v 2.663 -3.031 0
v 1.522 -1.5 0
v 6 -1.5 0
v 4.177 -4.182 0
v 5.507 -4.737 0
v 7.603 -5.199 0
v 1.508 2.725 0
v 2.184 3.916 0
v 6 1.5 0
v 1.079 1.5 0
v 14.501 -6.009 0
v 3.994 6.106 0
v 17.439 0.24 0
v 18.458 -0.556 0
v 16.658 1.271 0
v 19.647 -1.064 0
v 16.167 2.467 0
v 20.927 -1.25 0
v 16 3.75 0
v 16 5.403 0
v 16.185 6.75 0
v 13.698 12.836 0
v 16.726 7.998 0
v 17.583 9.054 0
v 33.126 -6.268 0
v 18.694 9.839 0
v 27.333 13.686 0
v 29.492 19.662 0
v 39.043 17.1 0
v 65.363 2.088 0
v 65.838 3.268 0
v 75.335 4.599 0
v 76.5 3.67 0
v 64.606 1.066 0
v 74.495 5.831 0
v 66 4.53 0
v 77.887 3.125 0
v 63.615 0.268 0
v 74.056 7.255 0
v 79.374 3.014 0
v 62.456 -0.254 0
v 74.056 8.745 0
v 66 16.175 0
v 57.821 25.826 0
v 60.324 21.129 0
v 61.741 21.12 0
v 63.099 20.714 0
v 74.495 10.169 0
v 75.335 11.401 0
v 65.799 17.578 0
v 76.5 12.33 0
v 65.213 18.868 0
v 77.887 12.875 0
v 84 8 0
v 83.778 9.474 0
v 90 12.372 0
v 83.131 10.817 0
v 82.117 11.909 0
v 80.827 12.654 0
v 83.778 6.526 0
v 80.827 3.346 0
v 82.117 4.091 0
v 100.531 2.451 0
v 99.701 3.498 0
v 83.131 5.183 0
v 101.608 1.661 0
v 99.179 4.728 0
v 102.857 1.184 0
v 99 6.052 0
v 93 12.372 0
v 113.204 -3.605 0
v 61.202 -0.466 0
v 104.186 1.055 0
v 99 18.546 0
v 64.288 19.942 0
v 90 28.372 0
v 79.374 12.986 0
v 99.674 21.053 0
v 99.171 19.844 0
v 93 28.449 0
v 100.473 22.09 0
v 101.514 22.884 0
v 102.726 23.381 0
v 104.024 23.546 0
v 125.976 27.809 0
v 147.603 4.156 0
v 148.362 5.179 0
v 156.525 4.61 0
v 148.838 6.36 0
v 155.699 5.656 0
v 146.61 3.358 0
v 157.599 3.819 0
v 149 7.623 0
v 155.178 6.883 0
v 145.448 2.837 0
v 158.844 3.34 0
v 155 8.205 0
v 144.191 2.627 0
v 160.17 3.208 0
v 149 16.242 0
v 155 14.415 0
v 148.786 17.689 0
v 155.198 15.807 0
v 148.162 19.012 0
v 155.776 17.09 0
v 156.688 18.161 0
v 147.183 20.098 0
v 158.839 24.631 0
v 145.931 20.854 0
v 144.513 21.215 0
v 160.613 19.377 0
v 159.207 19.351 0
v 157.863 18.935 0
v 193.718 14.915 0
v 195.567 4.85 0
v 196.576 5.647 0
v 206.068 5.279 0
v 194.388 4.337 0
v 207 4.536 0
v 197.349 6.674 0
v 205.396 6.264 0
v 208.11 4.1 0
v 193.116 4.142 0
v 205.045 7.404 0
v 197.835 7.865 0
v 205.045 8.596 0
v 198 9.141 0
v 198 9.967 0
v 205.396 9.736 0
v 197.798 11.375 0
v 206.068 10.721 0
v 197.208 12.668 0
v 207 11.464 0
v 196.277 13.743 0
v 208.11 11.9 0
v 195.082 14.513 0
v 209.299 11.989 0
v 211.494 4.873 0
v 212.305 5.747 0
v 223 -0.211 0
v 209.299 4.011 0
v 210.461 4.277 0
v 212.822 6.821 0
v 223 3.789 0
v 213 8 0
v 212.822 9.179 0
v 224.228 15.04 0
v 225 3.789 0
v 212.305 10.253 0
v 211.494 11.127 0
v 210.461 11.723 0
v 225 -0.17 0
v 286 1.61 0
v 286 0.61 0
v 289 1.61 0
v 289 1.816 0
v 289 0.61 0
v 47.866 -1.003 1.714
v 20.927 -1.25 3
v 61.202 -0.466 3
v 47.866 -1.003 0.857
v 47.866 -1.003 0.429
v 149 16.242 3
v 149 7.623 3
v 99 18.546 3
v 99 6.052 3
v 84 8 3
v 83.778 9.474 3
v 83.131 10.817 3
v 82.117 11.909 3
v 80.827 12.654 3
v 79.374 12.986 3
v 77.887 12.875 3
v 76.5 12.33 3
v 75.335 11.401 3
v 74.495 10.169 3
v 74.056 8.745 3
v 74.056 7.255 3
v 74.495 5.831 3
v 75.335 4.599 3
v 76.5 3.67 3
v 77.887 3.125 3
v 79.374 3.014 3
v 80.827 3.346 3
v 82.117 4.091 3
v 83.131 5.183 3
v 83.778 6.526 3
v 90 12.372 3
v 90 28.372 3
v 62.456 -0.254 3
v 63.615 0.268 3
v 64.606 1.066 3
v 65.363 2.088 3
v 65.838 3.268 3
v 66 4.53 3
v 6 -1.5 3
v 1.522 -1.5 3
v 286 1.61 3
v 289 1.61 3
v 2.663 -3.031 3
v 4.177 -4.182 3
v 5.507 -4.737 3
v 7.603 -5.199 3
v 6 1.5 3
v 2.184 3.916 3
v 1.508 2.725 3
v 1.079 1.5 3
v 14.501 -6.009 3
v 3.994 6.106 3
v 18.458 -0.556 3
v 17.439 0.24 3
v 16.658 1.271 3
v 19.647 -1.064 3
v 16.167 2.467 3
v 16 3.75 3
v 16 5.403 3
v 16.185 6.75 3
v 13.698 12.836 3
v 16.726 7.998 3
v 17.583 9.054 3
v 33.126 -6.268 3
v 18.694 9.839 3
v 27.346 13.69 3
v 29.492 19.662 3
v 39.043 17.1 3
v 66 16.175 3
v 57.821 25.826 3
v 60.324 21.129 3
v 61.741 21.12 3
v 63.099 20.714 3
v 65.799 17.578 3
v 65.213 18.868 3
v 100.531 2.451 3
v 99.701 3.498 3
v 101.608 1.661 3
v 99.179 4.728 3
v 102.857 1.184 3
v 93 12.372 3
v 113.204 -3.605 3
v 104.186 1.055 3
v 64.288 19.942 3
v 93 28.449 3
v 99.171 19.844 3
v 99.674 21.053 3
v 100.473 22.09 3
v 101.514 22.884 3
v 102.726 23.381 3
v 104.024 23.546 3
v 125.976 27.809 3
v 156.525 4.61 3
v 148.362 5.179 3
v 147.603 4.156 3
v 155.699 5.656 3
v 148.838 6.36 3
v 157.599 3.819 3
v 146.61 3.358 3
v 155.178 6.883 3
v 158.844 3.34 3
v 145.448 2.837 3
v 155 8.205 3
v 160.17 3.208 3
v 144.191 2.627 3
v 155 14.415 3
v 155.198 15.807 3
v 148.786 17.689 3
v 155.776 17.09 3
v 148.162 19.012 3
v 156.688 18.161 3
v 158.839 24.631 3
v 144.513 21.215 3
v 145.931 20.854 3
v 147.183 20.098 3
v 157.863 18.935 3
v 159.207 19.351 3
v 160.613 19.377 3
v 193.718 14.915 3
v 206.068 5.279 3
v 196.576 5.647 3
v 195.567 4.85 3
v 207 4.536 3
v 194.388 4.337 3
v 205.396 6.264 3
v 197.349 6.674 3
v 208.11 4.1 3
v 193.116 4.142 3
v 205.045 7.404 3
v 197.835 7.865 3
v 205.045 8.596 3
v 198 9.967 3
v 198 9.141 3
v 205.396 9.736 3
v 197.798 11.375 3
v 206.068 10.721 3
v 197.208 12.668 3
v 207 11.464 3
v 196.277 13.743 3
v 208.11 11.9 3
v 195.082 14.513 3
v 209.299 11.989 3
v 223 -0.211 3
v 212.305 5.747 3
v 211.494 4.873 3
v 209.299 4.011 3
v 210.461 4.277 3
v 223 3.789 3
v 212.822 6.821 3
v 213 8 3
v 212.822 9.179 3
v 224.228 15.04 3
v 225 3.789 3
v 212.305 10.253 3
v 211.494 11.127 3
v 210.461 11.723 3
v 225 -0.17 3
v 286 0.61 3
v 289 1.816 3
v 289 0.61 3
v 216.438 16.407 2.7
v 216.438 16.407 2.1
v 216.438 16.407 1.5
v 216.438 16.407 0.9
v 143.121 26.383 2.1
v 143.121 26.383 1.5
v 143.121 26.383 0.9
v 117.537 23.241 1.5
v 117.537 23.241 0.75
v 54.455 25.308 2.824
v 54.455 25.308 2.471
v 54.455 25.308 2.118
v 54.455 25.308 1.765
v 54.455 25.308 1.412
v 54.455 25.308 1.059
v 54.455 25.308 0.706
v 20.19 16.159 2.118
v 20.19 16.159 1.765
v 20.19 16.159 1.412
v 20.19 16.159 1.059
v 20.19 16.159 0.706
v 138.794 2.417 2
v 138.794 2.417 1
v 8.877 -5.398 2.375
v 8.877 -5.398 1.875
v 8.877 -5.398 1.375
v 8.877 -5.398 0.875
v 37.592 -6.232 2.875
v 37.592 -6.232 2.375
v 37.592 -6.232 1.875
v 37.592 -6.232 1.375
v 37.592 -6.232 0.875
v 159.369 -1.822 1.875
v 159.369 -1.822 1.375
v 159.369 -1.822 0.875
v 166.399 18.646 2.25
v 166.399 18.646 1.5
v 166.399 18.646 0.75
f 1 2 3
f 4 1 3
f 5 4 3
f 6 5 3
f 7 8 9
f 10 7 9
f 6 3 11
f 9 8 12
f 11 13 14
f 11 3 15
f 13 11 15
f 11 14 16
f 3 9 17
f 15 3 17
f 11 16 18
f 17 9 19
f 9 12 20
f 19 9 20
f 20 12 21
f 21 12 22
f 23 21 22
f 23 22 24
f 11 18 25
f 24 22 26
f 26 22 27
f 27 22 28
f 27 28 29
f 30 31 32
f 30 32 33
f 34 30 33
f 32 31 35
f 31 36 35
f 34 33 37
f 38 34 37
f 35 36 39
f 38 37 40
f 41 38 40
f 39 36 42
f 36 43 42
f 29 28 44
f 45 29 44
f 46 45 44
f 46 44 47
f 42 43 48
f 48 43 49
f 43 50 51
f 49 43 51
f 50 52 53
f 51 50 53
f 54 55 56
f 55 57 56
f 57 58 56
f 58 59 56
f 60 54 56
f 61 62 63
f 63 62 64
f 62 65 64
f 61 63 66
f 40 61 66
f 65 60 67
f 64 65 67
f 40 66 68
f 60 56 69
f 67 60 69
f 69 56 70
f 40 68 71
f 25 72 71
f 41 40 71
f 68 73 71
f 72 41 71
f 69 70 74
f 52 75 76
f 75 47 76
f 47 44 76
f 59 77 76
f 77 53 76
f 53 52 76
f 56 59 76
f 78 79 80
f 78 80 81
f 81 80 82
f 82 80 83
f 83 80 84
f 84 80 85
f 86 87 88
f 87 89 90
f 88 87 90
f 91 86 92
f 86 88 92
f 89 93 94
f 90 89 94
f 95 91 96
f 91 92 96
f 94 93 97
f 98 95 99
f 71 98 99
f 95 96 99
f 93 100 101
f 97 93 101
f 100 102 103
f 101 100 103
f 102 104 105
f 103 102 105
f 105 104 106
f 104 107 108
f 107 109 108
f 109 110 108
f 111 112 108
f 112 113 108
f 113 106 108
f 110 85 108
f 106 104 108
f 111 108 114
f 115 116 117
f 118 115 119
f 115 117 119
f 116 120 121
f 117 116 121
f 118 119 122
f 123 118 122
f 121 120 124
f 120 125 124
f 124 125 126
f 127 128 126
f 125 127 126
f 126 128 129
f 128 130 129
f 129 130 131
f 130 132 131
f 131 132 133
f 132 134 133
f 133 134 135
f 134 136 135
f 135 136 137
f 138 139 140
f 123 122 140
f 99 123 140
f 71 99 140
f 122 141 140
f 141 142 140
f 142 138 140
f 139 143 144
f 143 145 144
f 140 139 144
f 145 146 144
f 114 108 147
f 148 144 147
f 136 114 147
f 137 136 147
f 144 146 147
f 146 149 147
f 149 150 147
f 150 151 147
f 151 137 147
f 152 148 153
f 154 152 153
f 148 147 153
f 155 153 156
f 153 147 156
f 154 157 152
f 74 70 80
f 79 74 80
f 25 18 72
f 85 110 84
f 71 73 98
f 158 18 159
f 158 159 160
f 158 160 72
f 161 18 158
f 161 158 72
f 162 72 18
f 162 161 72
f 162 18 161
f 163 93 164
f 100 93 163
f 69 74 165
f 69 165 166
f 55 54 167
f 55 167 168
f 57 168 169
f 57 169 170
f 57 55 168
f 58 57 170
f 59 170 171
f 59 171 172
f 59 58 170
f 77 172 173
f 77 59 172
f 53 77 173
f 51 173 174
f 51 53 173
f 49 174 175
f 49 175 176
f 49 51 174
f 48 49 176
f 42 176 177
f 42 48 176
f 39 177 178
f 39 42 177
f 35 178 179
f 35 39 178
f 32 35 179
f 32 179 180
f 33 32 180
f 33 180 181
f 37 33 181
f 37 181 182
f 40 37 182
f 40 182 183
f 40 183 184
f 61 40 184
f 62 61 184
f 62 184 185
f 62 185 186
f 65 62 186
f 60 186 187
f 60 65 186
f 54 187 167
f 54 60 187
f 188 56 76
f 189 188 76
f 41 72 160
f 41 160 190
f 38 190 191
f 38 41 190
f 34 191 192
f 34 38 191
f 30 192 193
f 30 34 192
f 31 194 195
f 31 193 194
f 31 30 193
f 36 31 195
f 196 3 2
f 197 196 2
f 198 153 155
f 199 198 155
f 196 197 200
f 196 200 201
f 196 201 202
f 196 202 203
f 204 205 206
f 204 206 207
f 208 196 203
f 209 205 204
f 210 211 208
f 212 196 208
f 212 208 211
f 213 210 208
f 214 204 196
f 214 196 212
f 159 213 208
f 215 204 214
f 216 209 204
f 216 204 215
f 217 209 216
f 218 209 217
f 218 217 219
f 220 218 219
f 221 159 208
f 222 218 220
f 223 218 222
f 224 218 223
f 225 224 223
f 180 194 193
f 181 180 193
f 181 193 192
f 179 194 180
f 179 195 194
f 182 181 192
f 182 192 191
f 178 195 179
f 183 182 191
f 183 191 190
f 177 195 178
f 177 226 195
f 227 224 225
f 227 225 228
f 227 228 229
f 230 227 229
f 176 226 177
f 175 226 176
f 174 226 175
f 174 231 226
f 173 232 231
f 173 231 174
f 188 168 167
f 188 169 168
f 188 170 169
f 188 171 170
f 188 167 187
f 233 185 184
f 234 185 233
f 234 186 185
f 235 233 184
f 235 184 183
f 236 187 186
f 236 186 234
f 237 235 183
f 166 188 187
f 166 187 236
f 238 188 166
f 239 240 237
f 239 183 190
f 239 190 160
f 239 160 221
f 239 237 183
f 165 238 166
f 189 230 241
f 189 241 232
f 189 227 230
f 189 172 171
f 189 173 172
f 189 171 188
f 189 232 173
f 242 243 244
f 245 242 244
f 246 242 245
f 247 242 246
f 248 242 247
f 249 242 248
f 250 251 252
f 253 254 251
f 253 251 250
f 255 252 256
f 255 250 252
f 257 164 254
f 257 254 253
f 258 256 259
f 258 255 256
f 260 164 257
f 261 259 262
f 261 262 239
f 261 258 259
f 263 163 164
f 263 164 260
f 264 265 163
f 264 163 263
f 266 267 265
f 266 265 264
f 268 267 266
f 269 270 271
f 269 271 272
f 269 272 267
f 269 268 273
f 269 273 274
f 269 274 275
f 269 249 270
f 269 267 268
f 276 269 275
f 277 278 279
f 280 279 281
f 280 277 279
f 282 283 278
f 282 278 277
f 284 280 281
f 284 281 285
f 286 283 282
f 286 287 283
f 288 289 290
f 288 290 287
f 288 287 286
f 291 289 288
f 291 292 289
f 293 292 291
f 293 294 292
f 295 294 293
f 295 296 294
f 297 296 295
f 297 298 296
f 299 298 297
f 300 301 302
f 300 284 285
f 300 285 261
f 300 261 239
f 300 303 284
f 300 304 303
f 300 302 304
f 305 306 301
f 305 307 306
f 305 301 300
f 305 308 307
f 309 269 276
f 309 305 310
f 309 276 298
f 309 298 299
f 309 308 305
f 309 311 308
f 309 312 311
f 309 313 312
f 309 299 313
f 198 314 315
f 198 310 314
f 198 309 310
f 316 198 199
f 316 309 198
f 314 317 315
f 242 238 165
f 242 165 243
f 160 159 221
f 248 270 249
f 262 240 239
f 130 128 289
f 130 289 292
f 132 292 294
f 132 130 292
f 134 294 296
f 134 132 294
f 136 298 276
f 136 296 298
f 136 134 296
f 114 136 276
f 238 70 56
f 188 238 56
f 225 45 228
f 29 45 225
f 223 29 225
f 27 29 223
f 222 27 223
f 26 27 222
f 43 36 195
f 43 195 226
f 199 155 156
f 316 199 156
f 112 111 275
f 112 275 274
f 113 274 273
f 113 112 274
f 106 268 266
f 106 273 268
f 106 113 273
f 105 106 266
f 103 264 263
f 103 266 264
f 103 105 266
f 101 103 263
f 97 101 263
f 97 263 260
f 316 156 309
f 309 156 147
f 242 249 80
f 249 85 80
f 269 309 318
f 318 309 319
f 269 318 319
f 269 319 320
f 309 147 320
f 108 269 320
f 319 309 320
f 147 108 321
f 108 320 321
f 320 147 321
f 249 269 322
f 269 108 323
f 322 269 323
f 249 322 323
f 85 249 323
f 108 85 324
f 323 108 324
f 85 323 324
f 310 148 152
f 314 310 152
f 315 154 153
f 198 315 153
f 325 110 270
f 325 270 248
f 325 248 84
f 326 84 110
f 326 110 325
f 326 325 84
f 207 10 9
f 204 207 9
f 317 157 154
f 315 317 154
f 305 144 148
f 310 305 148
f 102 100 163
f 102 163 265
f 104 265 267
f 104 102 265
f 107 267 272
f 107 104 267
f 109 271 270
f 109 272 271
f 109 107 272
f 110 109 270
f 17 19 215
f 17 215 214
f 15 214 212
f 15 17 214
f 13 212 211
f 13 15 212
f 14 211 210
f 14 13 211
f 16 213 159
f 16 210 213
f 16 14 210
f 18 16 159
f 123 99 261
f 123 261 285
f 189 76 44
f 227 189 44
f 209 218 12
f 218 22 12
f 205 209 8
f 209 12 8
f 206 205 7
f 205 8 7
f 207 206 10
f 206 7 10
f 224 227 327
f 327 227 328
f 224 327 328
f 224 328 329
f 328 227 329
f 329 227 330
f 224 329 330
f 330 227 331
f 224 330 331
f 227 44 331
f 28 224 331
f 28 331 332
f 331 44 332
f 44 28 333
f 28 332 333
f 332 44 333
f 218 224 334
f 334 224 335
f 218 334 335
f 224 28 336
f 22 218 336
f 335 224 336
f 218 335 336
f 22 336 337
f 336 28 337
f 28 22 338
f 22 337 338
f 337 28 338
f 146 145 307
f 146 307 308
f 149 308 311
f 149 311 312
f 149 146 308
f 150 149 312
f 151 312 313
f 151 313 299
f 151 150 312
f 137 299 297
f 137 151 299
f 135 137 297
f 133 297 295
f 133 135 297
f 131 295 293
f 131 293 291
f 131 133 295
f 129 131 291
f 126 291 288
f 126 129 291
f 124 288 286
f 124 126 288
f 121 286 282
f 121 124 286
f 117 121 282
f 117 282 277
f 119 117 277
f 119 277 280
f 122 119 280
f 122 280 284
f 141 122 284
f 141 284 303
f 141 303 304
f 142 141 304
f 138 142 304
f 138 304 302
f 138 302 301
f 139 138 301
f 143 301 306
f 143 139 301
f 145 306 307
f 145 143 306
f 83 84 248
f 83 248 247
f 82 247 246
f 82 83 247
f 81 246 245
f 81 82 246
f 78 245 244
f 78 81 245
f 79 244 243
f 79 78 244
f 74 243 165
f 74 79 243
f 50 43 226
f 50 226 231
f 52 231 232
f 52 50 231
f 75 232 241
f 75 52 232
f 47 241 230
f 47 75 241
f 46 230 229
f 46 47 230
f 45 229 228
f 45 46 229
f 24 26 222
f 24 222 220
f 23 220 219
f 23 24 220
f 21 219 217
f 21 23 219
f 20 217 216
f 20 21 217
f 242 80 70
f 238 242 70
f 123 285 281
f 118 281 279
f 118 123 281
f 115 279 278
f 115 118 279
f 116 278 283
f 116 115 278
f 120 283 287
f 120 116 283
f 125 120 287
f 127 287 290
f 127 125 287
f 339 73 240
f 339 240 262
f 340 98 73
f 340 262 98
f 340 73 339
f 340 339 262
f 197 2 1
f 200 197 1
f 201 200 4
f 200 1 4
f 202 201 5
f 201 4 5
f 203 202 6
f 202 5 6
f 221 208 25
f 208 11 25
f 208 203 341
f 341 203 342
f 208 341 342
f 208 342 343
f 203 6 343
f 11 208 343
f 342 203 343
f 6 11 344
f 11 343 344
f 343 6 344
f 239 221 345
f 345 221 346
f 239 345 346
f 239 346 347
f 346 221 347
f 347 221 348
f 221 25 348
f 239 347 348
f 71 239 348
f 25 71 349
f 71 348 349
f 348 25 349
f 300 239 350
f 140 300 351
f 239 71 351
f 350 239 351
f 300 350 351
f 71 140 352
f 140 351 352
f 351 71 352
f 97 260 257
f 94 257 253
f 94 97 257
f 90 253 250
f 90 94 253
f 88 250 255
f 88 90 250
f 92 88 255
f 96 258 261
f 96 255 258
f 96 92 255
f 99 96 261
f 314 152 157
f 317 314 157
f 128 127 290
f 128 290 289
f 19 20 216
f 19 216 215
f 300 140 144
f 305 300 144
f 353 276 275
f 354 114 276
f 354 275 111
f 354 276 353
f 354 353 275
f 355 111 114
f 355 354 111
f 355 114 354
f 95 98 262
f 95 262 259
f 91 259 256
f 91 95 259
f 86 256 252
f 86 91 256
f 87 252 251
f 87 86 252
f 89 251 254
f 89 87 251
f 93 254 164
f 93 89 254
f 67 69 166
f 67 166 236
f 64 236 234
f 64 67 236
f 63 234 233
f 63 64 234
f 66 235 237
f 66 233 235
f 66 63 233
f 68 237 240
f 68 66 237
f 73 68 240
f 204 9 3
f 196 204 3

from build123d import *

# Parameters (mm, degrees)
SKETCH_1_R          = 5
SKETCH_1_R_2        = 4
EXTRUDE_1_DEPTH     = 3
CUT_EXTRUDE_2_DEPTH = 291.422386836


with BuildPart() as part:
    # 草图1 → 凸台-拉伸1 (new body)
    with BuildSketch(Plane.XY):
        with BuildLine():
            Line((90, 12.3715), (90, 28.372426217))
            add(Edge.make_bspline(
                [(90, 28.372426217), (89.259446982, 28.350928743), (82.363996343, 28.13322439), (72.403347361, 27.586524792), (60.185862052, 26.226268085), (51.080991088, 24.79810862), (42.033943524, 23.000087944), (34.581994337, 21.174922903), (28.697351661, 19.44563851), (24.361981086, 17.983441115), (20.174828998, 16.207949367), (16.078941989, 14.139912989), (12.040296713, 11.946766626), (8.14011433, 9.56039573), (5.153679337, 7.316395724), (3.100060439, 5.200618052), (1.813825976, 3.470730924), (1.237398467, 2.180506339), (1.085380705, 1.529058937), (1.078882286, 1.5)],
                knots=[0.345773533, 0.345773533, 0.345773533, 0.345773533, 0.349398211, 0.379527288, 0.394591827, 0.409656366, 0.424720905, 0.439785444, 0.447317713, 0.454849983, 0.462382252, 0.469914522, 0.477446791, 0.484979061, 0.49251133, 0.496277465, 0.5000436, 0.503809734, 0.503985678, 0.503985678, 0.503985678, 0.503985678], degree=3))
            Line((1.078882286, 1.5), (6, 1.5))
            Line((6, 1.5), (6, -1.5))
            Line((6, -1.5), (1.522379628, -1.5))
            add(Edge.make_bspline(
                [(1.522379628, -1.5), (1.617903461, -1.678770523), (2.068186491, -2.42442122), (3.143139608, -3.601090845), (4.854253, -4.619355756), (6.927567017, -5.105597911), (9.209034621, -5.454839075), (12.219971865, -5.84289763), (16.020132359, -6.14266222), (20.609524976, -6.2611368), (25.231457517, -6.286948592), (31.397380169, -6.280305851), (39.107274969, -6.240736398), (48.336813051, -6.022096429), (57.579935967, -5.612990736), (66.840654471, -5.242934226), (76.096556555, -4.921715721), (88.435998513, -4.515955408), (103.853120896, -3.973102953), (122.354625015, -3.248110744), (140.857835973, -2.495489966), (159.368527813, -1.804089638), (177.884173919, -1.222493213), (196.4033921, -0.774877257), (211.439290174, -0.454334834), (220.305576898, -0.265987383), (223, -0.210849605)],
                knots=[0.510182255, 0.510182255, 0.510182255, 0.510182255, 0.511342004, 0.515108139, 0.518874273, 0.522640408, 0.526406543, 0.530172677, 0.537704947, 0.545237216, 0.552769486, 0.560301755, 0.575366294, 0.590430833, 0.605495372, 0.620559911, 0.63562445, 0.650688989, 0.680818067, 0.710947144, 0.741076222, 0.7712053, 0.801334378, 0.831463456, 0.861592533, 0.874744372, 0.874744372, 0.874744372, 0.874744372], degree=3))
            Line((223, -0.210849605), (223, 3.788737263))
            Line((223, 3.788737263), (225, 3.788737263))
            Line((225, 3.788737263), (225, -0.170338801))
            add(Edge.make_bspline(
                [(225, -0.170338801), (227.811595191, -0.114017747), (236.796798206, 0.056910764), (251.961175933, 0.256656825), (270.471854229, 0.429163033), (282.824771355, 0.587434741), (289, 0.610062865)],
                knots=[0.877998396, 0.877998396, 0.877998396, 0.877998396, 0.891721611, 0.921850689, 0.951979767, 0.982108845, 0.982108845, 0.982108845, 0.982108845], degree=3))
            Line((289, 0.610062865), (286, 0.610062865))
            Line((286, 0.610062865), (286, 1.610062865))
            Line((286, 1.610062865), (289, 1.610062865))
            Line((289, 1.610062865), (289, 1.816246039))
            add(Edge.make_bspline(
                [(289, 1.816246039), (276.957314444, 4.502285023), (258.861554155, 8.397620333), (234.648247971, 13.152786595), (216.448478593, 16.478914183), (198.182873559, 19.371550405), (179.850571346, 21.924148488), (161.503162682, 24.358614825), (143.127892269, 26.473190985), (124.712239059, 28.043780086), (107.994173705, 28.616385423), (97.416270032, 28.546670082), (93, 28.44913561)],
                knots=[0.017978355, 0.017978355, 0.017978355, 0.017978355, 0.07823651, 0.108365588, 0.138494666, 0.168623744, 0.198752821, 0.228881899, 0.259010977, 0.289140055, 0.319269133, 0.340879606, 0.340879606, 0.340879606, 0.340879606], degree=3))
            Line((93, 28.44913561), (93, 12.3715))
            Line((93, 12.3715), (90, 12.3715))
        make_face()
        with Locations((79, 8)):
            Circle(SKETCH_1_R, mode=Mode.SUBTRACT)
        with Locations((209, 8)):
            Circle(SKETCH_1_R_2, mode=Mode.SUBTRACT)
    extrude(amount=EXTRUDE_1_DEPTH)

    # 草图3 → 切除-拉伸2 (cut, through all)
    with BuildSketch(Plane.XY):
        with BuildLine():
            Line((16, 5.402967421), (16, 3.749585631))
            ThreePointArc((16, 3.749585631), (17.438635496, 0.240072435), (20.926673148, -1.249876658))
            add(Edge.make_bspline(
                [(20.926673148, -1.249876658), (21.809693827, -1.262827876), (22.70041751, -1.270722289), (24.744752026, -1.282014543), (25.903390676, -1.283802206), (29.38108188, -1.283541675), (31.709604831, -1.277171959), (36.343989553, -1.248263334), (38.652190318, -1.223511787), (43.261210505, -1.138923387), (45.563329713, -1.080117385), (50.168153725, -0.92677743), (52.481550313, -0.831144642), (56.932408226, -0.642663317), (59.067384965, -0.552312083), (61.201531448, -0.466222597)],
                knots=[0.097228806, 0.097228806, 0.097228806, 0.097228806, 0.109375, 0.109375, 0.125, 0.125, 0.15625, 0.15625, 0.1875, 0.1875, 0.21875, 0.21875, 0.25, 0.25, 0.27850067, 0.27850067, 0.27850067, 0.27850067], degree=3))
            ThreePointArc((61.201531448, -0.466222597), (64.606082169, 1.066165303), (65.999999998, 4.529714259))
            Line((65.999999998, 4.529714259), (65.999999998, 16.175207171))
            ThreePointArc((65.999999998, 16.175207171), (64.287676461, 19.942325894), (60.323526607, 21.129234195))
            add(Edge.make_bspline(
                [(60.323526607, 21.129234195), (59.14328274, 20.968071656), (57.964431767, 20.796736398), (53.109249428, 20.046773379), (49.445857595, 19.384253181), (42.158673028, 17.868714577), (38.533379611, 17.019586343), (33.148990447, 15.546220745), (31.362942012, 15.022439399), (27.821005995, 13.880218625), (26.067238608, 13.253271835), (22.635818059, 11.812670552), (20.957942753, 11.004847704), (19.099592195, 10.049689097), (18.896441621, 9.944700093), (18.693547477, 9.839213217)],
                knots=[0.029920383, 0.029920383, 0.029920383, 0.029920383, 0.033494004, 0.033494004, 0.044658672, 0.044658672, 0.05582334, 0.05582334, 0.061405674, 0.061405674, 0.066988008, 0.066988008, 0.072570342, 0.072570342, 0.073256353, 0.073256353, 0.073256353, 0.073256353], degree=3))
            ThreePointArc((18.693547477, 9.839213217), (16.726110517, 7.997937304), (16, 5.402967421))
        make_face()
        with BuildLine():
            Line((99, 18.545958183), (99, 6.051698891))
            ThreePointArc((99, 6.051698891), (100.530987404, 2.450872374), (104.186380643, 1.055173873))
            add(Edge.make_bspline(
                [(104.186380643, 1.055173873), (106.39458867, 1.137544567), (108.602901821, 1.221357381), (120.131865001, 1.665786726), (129.456324286, 2.050051394), (140.592579239, 2.48797418), (142.3918285, 2.557905459), (144.191396926, 2.626842357)],
                knots=[0.470377348, 0.470377348, 0.470377348, 0.470377348, 0.5, 0.5, 0.625, 0.625, 0.649081852, 0.649081852, 0.649081852, 0.649081852], degree=3))
            ThreePointArc((144.191396926, 2.626842357), (147.602567462, 4.155973144), (149, 7.623177736))
            Line((149, 7.623177736), (149, 16.241622969))
            ThreePointArc((149, 16.241622969), (147.712532938, 19.59081678), (144.513160327, 21.215219904))
            add(Edge.make_bspline(
                [(144.513160327, 21.215219904), (143.652145828, 21.304056714), (142.791222193, 21.391146352), (137.856440927, 21.879784463), (133.787425472, 22.240923522), (125.659256001, 22.840362063), (121.601588339, 23.075546461), (113.037568805, 23.424275072), (108.53263967, 23.523953165), (104.024339014, 23.545898944)],
                knots=[0.736793621, 0.736793621, 0.736793621, 0.736793621, 0.75, 0.75, 0.8125, 0.8125, 0.875, 0.875, 0.944193059, 0.944193059, 0.944193059, 0.944193059], degree=3))
            ThreePointArc((104.024339014, 23.545898944), (100.473081733, 22.090086783), (99, 18.545958183))
        make_face()
        with BuildLine():
            Line((155, 14.41455393), (155, 8.204846233))
            ThreePointArc((155, 8.204846233), (156.525241738, 4.609563904), (160.17042201, 3.207751443))
            add(Edge.make_bspline(
                [(160.17042201, 3.207751443), (162.389721662, 3.283438922), (164.609319497, 3.356780918), (171.504636491, 3.576232826), (176.18199895, 3.713351663), (184.945921303, 3.946800138), (189.03214497, 4.046860263), (193.116453453, 4.14201244)],
                knots=[0.720326449, 0.720326449, 0.720326449, 0.720326449, 0.75, 0.75, 0.8125, 0.8125, 0.867133534, 0.867133534, 0.867133534, 0.867133534], degree=3))
            ThreePointArc((193.116453453, 4.14201244), (196.576469437, 5.64653729), (198, 9.140656115))
            Line((198, 9.140656115), (198, 9.967295711))
            ThreePointArc((198, 9.967295711), (196.781019979, 13.238975389), (193.718444833, 14.915410202))
            add(Edge.make_bspline(
                [(193.718444833, 14.915410202), (192.779013077, 15.051811632), (191.839123333, 15.187073825), (186.824226186, 15.902901834), (182.740892869, 16.465870736), (174.565909682, 17.575800313), (170.481299177, 18.120965891), (164.469973656, 18.894543341), (162.541485429, 19.138417507), (160.613475955, 19.376775938)],
                knots=[0.485575284, 0.485575284, 0.485575284, 0.485575284, 0.5, 0.5, 0.5625, 0.5625, 0.625, 0.625, 0.654532252, 0.654532252, 0.654532252, 0.654532252], degree=3))
            ThreePointArc((160.613475955, 19.376775938), (156.688458046, 18.160710613), (155, 14.41455393))
        make_face()
    extrude(amount=CUT_EXTRUDE_2_DEPTH, mode=Mode.SUBTRACT)


solid = part.part
